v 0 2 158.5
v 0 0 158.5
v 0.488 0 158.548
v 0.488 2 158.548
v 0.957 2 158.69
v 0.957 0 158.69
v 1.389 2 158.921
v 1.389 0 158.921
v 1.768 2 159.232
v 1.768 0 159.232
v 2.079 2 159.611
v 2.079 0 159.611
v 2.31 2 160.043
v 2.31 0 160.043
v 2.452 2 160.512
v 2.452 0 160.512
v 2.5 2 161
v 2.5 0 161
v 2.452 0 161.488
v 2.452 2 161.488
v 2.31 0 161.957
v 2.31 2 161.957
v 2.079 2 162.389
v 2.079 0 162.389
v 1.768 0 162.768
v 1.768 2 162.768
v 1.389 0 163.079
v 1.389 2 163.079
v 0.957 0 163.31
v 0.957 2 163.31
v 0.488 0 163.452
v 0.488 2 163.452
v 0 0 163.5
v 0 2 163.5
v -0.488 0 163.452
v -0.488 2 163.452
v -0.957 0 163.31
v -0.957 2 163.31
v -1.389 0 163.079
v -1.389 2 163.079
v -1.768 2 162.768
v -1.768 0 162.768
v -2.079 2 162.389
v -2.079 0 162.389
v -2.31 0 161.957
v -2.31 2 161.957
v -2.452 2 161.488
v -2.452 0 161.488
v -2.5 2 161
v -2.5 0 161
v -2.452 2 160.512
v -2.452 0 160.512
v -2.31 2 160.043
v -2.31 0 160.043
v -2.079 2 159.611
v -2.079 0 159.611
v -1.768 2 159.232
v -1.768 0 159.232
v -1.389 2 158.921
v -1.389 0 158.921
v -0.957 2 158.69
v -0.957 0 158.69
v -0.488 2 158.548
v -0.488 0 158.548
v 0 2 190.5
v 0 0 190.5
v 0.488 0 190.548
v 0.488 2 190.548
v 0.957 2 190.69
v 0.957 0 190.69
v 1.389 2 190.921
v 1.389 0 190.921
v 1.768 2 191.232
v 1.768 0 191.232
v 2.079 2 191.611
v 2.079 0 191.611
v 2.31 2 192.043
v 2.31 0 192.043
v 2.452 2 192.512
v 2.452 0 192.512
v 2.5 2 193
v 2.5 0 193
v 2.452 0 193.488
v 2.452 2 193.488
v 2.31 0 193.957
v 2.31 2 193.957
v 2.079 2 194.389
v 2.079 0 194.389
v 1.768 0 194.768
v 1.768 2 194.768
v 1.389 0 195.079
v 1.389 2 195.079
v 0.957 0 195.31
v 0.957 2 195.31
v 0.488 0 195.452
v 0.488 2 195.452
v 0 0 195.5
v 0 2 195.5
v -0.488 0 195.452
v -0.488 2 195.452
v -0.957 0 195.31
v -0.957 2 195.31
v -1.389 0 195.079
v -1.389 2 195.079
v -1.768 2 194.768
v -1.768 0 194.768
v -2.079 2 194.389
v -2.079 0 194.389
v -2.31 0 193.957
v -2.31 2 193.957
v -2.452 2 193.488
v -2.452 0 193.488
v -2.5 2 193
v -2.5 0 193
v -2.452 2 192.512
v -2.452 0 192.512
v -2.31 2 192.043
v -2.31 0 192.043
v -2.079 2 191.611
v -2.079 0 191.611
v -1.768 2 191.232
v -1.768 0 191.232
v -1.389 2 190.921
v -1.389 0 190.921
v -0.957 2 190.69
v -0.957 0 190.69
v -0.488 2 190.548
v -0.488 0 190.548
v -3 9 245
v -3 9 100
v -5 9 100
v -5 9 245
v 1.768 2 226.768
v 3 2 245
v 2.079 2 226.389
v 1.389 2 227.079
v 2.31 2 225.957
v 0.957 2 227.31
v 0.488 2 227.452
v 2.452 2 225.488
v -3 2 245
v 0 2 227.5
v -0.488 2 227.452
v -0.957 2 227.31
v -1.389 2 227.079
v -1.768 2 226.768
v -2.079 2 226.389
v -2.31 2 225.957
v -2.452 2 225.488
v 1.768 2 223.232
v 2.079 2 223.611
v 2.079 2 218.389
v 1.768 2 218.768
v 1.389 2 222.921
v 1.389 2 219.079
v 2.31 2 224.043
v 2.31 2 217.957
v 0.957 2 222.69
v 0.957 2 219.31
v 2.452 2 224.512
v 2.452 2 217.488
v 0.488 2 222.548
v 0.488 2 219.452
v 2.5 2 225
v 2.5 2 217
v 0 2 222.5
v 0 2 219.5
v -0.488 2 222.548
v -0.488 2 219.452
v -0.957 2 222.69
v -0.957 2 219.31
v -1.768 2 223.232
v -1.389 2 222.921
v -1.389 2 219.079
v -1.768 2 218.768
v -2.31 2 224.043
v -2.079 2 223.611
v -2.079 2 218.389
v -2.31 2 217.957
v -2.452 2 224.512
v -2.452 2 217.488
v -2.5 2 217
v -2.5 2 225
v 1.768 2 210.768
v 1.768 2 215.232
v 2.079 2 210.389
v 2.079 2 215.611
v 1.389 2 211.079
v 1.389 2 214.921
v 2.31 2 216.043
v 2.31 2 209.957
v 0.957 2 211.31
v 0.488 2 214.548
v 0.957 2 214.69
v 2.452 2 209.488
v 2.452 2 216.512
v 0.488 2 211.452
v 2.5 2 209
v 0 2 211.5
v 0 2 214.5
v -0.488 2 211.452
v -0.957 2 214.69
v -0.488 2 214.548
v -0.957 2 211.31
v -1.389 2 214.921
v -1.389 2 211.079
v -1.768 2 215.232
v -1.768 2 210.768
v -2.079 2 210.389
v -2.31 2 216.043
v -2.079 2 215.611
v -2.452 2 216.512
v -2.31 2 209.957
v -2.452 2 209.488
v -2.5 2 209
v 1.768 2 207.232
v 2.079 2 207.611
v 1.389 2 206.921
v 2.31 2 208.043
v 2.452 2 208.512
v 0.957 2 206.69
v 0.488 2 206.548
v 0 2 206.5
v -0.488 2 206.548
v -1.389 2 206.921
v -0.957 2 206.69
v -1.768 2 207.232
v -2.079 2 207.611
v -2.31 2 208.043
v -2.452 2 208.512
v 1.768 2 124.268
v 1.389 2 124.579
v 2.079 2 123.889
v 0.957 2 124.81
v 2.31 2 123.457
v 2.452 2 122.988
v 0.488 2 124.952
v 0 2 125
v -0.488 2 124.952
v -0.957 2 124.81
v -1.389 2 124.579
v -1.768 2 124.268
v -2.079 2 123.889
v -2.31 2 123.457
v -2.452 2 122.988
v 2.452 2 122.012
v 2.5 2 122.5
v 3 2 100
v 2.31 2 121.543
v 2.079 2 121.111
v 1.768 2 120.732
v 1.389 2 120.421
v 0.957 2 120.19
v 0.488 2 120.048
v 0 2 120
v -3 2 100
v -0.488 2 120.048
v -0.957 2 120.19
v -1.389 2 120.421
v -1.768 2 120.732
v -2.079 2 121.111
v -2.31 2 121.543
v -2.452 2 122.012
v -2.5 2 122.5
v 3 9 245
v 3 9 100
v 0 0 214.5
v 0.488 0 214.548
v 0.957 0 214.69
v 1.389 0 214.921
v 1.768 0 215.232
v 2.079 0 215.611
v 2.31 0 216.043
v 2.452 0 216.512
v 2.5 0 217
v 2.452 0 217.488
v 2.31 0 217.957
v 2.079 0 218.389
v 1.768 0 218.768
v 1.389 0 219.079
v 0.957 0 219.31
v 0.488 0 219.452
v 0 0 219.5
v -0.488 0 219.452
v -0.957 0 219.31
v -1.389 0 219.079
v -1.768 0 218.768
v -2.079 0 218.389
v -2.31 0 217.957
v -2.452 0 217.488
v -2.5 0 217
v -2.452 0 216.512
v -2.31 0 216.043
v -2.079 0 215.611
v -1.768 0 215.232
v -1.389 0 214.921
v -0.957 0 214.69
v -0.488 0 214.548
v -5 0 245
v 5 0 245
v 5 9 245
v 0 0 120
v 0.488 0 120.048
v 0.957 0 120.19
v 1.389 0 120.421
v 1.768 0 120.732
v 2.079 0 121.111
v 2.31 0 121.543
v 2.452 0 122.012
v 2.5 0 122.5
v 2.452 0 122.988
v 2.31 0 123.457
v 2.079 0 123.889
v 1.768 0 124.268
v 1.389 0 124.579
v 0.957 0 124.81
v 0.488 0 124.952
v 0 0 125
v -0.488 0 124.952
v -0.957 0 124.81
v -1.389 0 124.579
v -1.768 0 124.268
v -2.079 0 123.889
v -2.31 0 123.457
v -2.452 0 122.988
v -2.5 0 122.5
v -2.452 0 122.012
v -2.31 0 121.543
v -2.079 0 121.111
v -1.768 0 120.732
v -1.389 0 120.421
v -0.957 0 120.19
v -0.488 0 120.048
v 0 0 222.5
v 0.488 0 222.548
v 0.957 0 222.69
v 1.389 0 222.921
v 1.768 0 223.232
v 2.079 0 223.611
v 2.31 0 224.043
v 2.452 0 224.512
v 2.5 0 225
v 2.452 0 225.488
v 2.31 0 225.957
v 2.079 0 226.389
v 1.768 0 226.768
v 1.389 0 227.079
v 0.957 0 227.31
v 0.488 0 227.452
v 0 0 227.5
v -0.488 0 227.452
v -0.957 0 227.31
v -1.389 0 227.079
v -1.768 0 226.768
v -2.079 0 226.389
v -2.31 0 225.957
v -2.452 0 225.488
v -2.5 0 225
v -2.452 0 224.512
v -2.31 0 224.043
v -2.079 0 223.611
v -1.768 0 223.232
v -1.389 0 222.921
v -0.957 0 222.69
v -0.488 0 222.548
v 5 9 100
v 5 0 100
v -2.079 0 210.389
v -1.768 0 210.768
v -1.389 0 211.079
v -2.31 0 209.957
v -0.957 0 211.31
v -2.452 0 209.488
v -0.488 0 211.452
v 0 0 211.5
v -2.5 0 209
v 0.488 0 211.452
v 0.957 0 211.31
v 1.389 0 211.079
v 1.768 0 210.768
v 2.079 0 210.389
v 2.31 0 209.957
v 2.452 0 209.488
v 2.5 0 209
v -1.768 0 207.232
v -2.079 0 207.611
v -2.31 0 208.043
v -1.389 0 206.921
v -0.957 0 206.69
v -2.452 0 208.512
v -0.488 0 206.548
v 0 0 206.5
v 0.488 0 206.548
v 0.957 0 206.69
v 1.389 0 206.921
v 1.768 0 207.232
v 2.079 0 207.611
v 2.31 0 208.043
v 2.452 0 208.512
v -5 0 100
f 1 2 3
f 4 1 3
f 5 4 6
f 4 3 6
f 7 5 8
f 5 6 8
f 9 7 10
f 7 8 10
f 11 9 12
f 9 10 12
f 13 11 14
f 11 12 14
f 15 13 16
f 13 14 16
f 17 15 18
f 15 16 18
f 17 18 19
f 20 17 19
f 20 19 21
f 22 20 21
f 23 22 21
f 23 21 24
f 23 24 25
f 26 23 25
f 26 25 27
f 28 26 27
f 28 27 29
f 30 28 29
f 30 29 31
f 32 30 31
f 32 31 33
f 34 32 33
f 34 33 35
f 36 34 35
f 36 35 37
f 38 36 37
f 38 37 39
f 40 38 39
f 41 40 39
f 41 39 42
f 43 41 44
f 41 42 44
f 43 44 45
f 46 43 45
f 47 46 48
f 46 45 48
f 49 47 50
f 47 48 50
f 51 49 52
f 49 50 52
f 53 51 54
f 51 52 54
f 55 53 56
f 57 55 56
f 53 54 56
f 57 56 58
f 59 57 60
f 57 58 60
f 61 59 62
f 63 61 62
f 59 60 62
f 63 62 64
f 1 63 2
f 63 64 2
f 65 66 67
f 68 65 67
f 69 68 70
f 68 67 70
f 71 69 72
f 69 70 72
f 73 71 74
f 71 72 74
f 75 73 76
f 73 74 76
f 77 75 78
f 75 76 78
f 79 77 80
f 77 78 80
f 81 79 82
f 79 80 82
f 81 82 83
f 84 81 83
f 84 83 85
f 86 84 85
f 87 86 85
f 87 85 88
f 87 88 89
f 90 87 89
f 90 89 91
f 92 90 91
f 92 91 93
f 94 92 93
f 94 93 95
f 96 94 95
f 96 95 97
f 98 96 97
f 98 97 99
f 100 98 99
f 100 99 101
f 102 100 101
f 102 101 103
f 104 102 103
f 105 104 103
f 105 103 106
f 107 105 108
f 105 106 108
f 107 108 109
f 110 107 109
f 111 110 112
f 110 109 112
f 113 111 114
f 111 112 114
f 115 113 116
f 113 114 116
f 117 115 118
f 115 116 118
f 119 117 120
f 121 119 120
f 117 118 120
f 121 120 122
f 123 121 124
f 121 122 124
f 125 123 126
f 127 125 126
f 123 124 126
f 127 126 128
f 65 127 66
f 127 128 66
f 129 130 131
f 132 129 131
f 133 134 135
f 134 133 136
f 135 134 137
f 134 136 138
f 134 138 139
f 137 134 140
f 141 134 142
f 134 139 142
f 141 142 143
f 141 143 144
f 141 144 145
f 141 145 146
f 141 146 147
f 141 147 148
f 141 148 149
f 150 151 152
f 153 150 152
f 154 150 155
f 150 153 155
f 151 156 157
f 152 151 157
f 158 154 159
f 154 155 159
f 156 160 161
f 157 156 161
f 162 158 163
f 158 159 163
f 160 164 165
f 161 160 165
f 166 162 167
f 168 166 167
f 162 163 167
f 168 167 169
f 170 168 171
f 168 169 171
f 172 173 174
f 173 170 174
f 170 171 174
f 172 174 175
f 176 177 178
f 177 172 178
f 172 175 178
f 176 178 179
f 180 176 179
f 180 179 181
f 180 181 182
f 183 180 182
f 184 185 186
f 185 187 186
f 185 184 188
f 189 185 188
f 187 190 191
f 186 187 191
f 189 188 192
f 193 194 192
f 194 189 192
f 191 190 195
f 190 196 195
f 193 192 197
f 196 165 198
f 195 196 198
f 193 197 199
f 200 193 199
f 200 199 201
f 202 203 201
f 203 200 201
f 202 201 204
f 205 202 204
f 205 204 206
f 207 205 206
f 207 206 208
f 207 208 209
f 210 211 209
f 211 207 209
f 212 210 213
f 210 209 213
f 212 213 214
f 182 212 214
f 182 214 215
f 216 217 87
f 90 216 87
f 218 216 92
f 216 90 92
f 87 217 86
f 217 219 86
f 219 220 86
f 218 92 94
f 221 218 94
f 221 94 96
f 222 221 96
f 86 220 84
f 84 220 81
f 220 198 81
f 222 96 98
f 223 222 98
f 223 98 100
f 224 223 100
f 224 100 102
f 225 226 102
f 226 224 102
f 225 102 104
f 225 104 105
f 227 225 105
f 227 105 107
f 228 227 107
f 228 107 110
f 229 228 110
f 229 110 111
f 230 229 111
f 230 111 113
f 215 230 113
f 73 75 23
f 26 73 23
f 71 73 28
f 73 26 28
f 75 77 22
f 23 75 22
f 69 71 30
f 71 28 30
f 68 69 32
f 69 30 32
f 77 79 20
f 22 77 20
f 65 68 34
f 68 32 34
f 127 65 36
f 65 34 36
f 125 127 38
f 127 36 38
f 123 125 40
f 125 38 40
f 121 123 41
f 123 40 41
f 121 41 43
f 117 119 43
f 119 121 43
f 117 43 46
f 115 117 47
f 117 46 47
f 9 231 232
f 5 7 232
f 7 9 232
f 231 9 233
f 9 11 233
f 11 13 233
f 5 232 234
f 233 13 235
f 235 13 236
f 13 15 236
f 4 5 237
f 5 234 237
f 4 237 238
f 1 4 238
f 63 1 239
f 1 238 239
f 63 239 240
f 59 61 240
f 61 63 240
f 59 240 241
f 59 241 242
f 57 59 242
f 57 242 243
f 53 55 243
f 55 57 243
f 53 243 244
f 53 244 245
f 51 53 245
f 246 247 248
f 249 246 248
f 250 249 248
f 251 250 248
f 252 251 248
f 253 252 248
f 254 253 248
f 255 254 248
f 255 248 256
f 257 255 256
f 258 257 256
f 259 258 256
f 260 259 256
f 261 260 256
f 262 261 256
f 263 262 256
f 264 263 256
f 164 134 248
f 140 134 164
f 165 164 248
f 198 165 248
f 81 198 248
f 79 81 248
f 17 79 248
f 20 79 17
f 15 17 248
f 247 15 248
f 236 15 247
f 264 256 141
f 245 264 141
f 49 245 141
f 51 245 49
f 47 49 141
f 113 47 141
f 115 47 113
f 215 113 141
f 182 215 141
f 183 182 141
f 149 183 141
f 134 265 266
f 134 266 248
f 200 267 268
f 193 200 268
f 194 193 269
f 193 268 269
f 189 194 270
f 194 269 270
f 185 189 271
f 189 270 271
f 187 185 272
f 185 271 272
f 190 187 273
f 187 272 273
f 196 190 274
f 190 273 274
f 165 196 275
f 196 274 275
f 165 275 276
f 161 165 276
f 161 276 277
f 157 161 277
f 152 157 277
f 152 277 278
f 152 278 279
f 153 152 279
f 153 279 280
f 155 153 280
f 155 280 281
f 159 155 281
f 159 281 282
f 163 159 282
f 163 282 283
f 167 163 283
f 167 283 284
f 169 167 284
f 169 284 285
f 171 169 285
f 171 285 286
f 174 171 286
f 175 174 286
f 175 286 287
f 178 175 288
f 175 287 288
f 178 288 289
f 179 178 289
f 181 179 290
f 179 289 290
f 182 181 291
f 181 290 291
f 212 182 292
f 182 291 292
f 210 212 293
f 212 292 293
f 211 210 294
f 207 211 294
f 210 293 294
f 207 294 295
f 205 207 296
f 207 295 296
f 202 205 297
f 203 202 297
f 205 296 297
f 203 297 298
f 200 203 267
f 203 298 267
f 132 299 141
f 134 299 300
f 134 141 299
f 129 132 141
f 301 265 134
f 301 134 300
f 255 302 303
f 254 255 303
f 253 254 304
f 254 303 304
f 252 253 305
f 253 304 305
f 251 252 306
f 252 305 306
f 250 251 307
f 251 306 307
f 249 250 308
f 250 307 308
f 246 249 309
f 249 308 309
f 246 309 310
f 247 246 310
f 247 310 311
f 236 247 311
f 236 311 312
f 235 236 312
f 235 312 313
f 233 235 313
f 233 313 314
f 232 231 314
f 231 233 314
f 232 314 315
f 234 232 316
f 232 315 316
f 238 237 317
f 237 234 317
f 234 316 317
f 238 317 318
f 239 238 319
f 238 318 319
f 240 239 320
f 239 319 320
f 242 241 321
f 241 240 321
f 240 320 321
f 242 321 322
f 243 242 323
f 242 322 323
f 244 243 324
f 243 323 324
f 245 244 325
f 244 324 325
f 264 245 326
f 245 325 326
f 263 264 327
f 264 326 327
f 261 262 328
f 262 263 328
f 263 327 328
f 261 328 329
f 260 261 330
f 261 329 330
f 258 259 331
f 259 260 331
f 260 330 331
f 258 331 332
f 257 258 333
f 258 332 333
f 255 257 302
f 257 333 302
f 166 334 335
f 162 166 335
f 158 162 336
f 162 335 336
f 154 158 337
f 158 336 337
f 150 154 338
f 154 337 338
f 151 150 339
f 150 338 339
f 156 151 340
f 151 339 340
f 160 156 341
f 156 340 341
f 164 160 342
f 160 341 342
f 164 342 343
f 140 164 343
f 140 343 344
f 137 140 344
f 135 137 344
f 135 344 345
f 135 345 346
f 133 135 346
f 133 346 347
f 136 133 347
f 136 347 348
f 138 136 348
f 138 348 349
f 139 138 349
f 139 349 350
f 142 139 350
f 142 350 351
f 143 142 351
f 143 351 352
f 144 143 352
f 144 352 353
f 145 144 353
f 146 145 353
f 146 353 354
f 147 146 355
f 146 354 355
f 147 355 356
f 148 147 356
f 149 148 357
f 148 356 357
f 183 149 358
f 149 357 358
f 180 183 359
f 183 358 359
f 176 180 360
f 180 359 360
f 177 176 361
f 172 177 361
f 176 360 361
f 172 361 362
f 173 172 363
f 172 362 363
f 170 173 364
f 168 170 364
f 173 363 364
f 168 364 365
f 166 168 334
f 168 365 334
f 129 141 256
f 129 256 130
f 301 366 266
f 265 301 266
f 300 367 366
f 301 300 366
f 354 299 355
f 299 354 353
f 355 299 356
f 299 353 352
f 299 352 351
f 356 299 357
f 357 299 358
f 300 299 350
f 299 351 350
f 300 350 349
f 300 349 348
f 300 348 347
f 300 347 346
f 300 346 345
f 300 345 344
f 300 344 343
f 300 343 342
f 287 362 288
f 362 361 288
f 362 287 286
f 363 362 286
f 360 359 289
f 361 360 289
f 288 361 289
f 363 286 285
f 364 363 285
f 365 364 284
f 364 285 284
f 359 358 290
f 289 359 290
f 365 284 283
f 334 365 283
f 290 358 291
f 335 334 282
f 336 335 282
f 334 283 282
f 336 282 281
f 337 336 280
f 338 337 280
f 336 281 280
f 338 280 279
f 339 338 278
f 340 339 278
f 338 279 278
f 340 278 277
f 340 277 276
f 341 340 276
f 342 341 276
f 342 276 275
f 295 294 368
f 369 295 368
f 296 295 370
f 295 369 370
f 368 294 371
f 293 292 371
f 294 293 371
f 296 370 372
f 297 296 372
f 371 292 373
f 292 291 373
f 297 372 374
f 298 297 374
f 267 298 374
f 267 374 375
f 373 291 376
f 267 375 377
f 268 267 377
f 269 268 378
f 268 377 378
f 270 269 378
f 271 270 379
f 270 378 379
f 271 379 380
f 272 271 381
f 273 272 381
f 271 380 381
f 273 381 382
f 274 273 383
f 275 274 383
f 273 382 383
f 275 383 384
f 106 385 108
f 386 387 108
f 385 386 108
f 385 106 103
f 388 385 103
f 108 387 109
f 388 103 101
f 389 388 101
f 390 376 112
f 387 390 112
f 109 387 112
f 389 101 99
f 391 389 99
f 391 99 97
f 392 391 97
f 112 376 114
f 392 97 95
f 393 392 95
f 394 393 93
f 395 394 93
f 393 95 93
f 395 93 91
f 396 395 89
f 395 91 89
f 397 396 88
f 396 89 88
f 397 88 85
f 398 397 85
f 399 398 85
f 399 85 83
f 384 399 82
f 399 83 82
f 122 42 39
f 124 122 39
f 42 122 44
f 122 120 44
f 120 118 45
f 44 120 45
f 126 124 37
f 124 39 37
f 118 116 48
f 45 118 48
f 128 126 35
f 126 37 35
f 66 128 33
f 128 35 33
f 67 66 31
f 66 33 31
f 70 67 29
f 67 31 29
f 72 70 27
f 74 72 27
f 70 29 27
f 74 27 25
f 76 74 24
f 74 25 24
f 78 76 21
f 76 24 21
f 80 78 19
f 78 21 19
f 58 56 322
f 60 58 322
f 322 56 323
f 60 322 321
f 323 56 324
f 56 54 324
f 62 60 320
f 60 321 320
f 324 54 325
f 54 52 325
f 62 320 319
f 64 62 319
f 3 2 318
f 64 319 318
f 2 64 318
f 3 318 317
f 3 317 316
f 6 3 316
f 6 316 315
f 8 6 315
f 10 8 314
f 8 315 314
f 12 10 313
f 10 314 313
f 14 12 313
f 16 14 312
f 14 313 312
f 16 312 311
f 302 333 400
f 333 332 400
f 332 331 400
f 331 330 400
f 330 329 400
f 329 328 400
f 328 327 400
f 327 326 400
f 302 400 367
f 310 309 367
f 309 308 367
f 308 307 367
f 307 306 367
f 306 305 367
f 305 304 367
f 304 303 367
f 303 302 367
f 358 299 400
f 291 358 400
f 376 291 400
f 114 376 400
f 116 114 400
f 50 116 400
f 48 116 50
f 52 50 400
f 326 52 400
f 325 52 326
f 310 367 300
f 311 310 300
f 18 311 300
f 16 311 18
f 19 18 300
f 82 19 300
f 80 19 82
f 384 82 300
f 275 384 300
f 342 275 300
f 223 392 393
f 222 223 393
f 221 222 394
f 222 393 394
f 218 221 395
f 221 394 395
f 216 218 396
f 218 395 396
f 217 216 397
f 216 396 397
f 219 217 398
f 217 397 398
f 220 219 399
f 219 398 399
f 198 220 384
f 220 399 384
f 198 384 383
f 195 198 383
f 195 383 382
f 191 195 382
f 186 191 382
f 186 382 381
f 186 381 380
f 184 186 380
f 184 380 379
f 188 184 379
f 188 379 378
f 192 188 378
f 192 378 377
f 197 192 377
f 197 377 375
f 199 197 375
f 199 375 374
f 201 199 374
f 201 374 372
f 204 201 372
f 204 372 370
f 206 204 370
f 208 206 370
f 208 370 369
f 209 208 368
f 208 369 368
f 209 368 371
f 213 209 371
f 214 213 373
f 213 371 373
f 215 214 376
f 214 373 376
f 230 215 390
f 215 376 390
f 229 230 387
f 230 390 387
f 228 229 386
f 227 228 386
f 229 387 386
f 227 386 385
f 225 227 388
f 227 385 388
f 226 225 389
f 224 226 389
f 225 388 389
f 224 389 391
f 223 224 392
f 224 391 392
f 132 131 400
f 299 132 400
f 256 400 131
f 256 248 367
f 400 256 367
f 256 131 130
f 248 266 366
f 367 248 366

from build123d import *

# Parameters (mm, degrees)
EXTRUDE_1_DEPTH          = 245
SKETCH_2_R               = 2.5
CUT_EXTRUDE_1_DEPTH      = 246.21623111
CUT_EXTRUDE_2_DEPTH      = 246.21623111
CUT_EXTRUDE_2_DEPTH_BACK = 246.21623111
SKETCH_3_W               = 10
SKETCH_3_H               = 100


with BuildPart() as part:
    # ｽｹｯﾁ1 → ﾎﾞｽ - 押し出し1 (new body)
    with BuildSketch(Plane.XY):
        Polygon((-5, 9), (-5, 0), (5, 0), (5, 9), (3, 9), (3, 2), (-3, 2), (-3, 9), align=None)
    extrude(amount=EXTRUDE_1_DEPTH)

    # ｽｹｯﾁ2 → ｶｯﾄ - 押し出し1 (cut, through all)
    with BuildSketch(Plane.XZ):
        with Locations(Location((0, 225, 0), (0, 0, 270))):
            Circle(SKETCH_2_R)
        with Locations(Location((0, 217, 0), (0, 0, 270))):
            Circle(SKETCH_2_R)
        with Locations(Location((0, 122.5, 0), (0, 0, 270))):
            Circle(SKETCH_2_R)
        with Locations(Location((0, 209, 0), (0, 0, 270))):
            Circle(SKETCH_2_R)
        with Locations(Location((0, 193, 0), (0, 0, 270))):
            Circle(SKETCH_2_R)
        with Locations(Location((0, 161, 0), (0, 0, 270))):
            Circle(SKETCH_2_R)
    cut_extrude_1 = extrude(amount=-CUT_EXTRUDE_1_DEPTH, mode=Mode.SUBTRACT)

    # ﾐﾗｰ1: ｶｯﾄ - 押し出し1 across plane
    add(cut_extrude_1.mirror(Plane.XY.offset(122.5)), mode=Mode.SUBTRACT)

    # ｽｹｯﾁ3 → ｶｯﾄ - 押し出し2 (cut, two sides: drawn at the far end of the back side and taken through both)
    with BuildSketch(Plane.XZ.offset(-CUT_EXTRUDE_2_DEPTH_BACK)):
        with Locations((0, 50)):
            Rectangle(SKETCH_3_W, SKETCH_3_H)
    extrude(amount=CUT_EXTRUDE_2_DEPTH + CUT_EXTRUDE_2_DEPTH_BACK, mode=Mode.SUBTRACT)


solid = part.part
